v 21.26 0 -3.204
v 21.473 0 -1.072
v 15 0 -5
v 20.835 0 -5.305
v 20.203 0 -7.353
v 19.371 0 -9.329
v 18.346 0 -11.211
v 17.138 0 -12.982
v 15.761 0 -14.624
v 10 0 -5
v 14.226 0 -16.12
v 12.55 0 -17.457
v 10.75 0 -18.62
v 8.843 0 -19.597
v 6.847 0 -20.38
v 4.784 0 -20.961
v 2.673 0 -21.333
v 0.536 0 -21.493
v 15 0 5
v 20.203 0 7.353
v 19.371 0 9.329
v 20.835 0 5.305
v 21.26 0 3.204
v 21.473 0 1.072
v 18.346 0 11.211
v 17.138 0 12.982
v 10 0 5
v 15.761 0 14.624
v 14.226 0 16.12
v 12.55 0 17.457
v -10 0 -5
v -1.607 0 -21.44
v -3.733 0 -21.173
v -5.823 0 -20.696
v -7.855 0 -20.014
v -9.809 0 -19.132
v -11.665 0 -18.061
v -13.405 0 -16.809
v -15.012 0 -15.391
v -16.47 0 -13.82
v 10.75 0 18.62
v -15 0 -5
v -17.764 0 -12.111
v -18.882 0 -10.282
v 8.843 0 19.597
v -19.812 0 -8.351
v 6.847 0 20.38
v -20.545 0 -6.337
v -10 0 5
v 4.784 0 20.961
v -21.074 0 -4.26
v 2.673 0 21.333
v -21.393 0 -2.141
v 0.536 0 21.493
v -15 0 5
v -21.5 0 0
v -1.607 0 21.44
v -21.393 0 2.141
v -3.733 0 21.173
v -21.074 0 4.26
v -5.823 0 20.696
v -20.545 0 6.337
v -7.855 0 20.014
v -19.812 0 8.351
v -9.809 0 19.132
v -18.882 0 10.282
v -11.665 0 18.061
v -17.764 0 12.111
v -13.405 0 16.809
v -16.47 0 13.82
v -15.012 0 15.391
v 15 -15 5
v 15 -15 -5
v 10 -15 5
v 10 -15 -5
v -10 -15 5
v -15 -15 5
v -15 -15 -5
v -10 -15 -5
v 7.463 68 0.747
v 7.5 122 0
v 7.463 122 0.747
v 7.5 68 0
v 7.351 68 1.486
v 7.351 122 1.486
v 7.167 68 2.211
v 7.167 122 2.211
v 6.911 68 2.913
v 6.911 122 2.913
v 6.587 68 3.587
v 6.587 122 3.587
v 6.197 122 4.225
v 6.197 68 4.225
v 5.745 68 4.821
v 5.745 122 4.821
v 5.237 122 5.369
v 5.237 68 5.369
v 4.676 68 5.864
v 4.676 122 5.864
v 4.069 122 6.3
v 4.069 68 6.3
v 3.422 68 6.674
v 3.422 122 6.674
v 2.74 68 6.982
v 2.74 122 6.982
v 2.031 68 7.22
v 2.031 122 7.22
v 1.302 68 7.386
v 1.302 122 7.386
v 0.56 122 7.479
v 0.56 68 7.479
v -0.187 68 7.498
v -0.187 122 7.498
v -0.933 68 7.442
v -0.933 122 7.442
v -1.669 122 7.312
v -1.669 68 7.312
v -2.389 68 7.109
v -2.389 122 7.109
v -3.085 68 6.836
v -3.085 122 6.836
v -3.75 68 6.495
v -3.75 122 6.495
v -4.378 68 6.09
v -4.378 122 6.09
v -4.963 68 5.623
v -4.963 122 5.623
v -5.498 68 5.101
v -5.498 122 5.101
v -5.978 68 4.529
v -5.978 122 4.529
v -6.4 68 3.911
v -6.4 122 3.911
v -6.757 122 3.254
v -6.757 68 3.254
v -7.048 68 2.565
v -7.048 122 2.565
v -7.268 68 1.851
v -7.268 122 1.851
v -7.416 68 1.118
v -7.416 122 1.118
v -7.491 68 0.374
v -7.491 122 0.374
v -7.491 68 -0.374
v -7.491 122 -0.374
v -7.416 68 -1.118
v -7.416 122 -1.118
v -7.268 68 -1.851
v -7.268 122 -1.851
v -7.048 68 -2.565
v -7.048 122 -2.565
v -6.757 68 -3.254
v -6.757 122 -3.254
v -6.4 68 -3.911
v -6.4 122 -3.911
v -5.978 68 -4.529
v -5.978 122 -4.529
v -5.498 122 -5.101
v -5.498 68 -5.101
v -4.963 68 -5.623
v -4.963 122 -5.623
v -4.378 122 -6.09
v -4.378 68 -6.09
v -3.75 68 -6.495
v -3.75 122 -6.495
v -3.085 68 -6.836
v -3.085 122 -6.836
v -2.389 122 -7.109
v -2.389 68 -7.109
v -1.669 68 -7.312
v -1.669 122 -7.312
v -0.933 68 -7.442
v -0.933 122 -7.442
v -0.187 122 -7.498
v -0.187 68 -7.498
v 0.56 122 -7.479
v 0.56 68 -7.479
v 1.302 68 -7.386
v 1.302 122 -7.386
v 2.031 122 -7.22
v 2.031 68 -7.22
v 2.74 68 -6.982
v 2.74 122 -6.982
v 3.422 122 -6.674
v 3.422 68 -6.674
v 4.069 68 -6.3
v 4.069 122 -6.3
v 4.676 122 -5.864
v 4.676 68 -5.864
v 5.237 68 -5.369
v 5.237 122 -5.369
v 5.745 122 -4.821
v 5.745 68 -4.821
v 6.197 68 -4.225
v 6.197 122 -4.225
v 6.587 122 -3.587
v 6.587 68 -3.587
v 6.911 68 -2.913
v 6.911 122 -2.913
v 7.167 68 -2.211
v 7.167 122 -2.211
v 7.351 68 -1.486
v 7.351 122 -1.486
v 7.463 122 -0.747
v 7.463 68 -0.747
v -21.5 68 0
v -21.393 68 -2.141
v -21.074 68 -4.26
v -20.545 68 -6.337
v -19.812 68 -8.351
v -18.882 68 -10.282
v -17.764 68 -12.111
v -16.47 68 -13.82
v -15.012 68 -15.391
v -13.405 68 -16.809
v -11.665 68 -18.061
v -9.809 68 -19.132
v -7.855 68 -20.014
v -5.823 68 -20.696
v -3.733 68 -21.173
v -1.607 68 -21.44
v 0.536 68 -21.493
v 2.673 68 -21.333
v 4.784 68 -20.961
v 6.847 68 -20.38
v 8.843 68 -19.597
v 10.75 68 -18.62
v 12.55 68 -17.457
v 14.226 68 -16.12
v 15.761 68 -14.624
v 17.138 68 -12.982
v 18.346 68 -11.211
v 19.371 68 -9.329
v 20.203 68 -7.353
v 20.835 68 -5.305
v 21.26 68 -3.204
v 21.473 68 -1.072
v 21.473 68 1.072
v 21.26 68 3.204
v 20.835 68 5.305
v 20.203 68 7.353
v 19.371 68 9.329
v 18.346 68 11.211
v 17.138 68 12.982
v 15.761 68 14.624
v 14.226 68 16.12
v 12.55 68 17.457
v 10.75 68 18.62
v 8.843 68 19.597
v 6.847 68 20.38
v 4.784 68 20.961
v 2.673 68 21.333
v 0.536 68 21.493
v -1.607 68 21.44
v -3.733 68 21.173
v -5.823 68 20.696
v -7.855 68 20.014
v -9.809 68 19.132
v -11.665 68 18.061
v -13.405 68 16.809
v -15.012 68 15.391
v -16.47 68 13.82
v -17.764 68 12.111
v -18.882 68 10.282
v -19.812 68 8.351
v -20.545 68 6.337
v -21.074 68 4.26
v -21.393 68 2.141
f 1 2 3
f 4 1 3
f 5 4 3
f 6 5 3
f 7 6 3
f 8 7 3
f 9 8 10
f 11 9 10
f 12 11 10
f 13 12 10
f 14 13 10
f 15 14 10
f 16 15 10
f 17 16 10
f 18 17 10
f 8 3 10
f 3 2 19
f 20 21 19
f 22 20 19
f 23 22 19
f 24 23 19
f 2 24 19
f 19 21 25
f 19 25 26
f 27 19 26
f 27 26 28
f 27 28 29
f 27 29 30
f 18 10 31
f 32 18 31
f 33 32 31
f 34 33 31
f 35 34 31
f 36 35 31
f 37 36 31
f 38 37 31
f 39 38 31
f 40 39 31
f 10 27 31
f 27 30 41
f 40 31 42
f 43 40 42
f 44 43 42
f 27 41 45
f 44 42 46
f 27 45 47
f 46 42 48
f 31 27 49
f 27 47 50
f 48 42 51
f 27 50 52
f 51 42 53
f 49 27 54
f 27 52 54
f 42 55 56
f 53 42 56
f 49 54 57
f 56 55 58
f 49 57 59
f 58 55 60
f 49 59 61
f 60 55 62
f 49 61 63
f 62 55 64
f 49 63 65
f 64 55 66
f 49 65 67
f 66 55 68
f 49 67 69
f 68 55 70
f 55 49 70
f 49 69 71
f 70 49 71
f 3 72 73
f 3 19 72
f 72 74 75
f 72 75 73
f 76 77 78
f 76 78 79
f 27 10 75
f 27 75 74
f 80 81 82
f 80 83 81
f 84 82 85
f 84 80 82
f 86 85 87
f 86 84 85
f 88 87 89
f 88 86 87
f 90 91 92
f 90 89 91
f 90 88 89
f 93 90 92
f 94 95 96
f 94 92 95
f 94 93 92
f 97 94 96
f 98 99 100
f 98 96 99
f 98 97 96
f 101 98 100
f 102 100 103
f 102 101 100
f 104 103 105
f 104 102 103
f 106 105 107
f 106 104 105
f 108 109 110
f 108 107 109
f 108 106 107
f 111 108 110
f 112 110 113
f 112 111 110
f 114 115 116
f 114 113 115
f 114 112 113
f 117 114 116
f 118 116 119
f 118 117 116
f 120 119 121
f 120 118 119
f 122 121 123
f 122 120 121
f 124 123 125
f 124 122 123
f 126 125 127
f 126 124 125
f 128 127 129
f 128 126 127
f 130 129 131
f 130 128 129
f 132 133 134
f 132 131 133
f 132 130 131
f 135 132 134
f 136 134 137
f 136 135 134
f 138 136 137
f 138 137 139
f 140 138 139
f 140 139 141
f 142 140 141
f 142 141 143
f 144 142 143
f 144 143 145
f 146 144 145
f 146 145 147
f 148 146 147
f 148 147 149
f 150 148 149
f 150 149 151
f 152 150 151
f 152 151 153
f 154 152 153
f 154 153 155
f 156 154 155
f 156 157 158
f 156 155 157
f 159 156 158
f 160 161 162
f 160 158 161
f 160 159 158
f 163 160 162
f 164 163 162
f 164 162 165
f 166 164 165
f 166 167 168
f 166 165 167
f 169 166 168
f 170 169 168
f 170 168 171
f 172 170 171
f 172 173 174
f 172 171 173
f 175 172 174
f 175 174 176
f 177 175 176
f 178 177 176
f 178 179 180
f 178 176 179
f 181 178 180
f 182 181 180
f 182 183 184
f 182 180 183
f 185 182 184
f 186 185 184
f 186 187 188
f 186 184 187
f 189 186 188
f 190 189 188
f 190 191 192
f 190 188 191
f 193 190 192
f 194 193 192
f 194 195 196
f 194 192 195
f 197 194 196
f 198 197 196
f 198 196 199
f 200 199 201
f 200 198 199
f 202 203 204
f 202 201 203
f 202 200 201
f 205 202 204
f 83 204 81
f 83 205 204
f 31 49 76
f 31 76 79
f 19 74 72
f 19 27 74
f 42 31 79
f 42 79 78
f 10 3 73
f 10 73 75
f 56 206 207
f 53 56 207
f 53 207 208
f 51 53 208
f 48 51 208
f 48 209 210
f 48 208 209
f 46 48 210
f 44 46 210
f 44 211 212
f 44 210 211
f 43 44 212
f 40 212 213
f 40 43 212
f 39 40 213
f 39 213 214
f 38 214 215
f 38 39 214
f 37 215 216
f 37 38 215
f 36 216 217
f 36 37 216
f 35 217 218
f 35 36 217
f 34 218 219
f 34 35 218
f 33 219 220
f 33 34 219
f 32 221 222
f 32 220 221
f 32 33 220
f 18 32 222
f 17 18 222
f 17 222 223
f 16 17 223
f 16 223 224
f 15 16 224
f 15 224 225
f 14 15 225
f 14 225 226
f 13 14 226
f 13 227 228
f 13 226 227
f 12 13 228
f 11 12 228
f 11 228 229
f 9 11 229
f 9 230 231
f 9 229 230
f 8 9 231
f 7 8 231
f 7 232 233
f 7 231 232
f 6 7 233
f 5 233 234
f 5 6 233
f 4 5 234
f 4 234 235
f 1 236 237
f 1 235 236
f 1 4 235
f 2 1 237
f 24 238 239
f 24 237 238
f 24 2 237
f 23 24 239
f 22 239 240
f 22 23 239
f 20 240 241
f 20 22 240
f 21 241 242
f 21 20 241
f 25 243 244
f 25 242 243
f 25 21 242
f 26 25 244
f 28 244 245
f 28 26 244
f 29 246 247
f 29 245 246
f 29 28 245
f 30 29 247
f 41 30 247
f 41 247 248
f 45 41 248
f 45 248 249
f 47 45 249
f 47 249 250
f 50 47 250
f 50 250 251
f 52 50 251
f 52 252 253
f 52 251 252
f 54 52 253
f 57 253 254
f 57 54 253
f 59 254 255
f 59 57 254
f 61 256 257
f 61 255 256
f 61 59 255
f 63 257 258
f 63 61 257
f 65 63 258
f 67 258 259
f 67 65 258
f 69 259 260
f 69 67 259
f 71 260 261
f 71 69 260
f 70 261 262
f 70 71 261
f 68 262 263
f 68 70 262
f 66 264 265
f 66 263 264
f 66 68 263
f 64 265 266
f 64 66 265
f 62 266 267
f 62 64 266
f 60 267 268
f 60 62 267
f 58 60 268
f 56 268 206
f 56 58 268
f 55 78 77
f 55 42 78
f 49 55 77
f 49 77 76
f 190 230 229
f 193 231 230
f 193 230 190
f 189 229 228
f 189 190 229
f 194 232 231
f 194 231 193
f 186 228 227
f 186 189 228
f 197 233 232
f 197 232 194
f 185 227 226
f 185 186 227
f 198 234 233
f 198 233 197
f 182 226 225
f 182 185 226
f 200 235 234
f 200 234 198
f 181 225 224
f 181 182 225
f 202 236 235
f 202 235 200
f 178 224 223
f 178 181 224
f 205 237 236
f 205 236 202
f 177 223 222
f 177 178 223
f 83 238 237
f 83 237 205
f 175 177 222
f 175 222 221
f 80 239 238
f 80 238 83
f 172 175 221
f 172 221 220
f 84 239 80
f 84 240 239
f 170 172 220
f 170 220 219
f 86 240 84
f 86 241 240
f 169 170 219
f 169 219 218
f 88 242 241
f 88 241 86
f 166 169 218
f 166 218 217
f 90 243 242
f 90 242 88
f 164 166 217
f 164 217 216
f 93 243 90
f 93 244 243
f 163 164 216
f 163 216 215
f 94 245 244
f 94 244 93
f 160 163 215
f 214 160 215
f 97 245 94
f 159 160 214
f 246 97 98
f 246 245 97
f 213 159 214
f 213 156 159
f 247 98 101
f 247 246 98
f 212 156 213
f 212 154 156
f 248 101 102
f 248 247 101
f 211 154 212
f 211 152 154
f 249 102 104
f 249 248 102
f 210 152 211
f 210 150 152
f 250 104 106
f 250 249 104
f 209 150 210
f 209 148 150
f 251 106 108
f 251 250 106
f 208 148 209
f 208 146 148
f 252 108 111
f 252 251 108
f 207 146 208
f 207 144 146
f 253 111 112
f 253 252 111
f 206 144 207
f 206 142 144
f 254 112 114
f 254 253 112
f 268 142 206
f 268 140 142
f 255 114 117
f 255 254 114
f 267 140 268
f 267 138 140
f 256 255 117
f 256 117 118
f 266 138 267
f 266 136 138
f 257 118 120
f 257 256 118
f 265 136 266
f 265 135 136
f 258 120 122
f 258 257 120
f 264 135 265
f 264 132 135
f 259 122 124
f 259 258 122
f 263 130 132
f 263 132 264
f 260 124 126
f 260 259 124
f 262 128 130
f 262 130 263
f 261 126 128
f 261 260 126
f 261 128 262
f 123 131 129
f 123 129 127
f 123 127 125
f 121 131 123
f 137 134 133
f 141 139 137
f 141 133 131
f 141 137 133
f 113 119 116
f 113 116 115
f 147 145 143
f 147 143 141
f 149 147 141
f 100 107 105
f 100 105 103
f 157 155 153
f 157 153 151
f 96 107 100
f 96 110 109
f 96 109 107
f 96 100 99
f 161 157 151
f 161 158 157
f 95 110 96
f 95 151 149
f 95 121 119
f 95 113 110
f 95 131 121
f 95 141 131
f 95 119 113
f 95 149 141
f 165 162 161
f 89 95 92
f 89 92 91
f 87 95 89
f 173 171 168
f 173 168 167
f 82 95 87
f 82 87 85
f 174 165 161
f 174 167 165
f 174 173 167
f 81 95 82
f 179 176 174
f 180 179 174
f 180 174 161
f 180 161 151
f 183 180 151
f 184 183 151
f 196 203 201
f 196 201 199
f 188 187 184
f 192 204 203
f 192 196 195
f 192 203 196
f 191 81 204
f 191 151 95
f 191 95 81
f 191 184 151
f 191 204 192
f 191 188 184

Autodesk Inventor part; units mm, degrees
ref_plane "YZ Plane" through (0, 0, 0) normal (1, 0, 0) x (0, 1, 0)
ref_plane "XZ Plane" through (0, 0, 0) normal (0, 1, 0) x (-1, 0, 0)
ref_plane "XY Plane" through (0, 0, 0) normal (0, 0, 1) x (1, 0, 0)
sketch "Sketch1" plane through (0, 0, 0) normal (0, 1, 0) x (-1, 0, 0)
  circle A0 centre (0, 0) radius 21.5
  dimension "d0" = 43
extrude "Extrusion1" add sketch "Sketch1" along normal blind 68
sketch "Sketch2" plane through (0, 68, 0) normal (0, 1, 0) x (1, 0, 0)
  circle A0 centre (0, 0) radius 7.5
  dimension "d3" = 15
extrude "Extrusion2" add sketch "Sketch2" along normal blind 54
sketch "Sketch3" plane through (0, 0, 0) normal (0, -1, 0) x (1, 0, 0)
  line L0 (-15, 5) -> (-10, 5)
  line L1 (-10, 5) -> (-10, -5)
  line L2 (-10, -5) -> (-15, -5)
  line L3 (-15, -5) -> (-15, 5)
  line L4 (10, 5) -> (15, 5)
  line L5 (15, 5) -> (15, -5)
  line L6 (15, -5) -> (10, -5)
  line L7 (10, -5) -> (10, 5)
  line L8 (0, 0) -> (-29.5746, 0)
  circle A0 centre (0, 0) radius 7.5 projected
  line L9 (0, 0) -> (0, 33.0968)
  dimension "d6" = 10
  dimension "d7" = 5
  dimension "d8" = 20
extrude "Extrusion3" add sketch "Sketch3" along normal blind 15 contours L0 L1 L8 L3 | L8 L1 L2 L3 | L4 L5 L6 L7
properties part number "Dremel motor"
